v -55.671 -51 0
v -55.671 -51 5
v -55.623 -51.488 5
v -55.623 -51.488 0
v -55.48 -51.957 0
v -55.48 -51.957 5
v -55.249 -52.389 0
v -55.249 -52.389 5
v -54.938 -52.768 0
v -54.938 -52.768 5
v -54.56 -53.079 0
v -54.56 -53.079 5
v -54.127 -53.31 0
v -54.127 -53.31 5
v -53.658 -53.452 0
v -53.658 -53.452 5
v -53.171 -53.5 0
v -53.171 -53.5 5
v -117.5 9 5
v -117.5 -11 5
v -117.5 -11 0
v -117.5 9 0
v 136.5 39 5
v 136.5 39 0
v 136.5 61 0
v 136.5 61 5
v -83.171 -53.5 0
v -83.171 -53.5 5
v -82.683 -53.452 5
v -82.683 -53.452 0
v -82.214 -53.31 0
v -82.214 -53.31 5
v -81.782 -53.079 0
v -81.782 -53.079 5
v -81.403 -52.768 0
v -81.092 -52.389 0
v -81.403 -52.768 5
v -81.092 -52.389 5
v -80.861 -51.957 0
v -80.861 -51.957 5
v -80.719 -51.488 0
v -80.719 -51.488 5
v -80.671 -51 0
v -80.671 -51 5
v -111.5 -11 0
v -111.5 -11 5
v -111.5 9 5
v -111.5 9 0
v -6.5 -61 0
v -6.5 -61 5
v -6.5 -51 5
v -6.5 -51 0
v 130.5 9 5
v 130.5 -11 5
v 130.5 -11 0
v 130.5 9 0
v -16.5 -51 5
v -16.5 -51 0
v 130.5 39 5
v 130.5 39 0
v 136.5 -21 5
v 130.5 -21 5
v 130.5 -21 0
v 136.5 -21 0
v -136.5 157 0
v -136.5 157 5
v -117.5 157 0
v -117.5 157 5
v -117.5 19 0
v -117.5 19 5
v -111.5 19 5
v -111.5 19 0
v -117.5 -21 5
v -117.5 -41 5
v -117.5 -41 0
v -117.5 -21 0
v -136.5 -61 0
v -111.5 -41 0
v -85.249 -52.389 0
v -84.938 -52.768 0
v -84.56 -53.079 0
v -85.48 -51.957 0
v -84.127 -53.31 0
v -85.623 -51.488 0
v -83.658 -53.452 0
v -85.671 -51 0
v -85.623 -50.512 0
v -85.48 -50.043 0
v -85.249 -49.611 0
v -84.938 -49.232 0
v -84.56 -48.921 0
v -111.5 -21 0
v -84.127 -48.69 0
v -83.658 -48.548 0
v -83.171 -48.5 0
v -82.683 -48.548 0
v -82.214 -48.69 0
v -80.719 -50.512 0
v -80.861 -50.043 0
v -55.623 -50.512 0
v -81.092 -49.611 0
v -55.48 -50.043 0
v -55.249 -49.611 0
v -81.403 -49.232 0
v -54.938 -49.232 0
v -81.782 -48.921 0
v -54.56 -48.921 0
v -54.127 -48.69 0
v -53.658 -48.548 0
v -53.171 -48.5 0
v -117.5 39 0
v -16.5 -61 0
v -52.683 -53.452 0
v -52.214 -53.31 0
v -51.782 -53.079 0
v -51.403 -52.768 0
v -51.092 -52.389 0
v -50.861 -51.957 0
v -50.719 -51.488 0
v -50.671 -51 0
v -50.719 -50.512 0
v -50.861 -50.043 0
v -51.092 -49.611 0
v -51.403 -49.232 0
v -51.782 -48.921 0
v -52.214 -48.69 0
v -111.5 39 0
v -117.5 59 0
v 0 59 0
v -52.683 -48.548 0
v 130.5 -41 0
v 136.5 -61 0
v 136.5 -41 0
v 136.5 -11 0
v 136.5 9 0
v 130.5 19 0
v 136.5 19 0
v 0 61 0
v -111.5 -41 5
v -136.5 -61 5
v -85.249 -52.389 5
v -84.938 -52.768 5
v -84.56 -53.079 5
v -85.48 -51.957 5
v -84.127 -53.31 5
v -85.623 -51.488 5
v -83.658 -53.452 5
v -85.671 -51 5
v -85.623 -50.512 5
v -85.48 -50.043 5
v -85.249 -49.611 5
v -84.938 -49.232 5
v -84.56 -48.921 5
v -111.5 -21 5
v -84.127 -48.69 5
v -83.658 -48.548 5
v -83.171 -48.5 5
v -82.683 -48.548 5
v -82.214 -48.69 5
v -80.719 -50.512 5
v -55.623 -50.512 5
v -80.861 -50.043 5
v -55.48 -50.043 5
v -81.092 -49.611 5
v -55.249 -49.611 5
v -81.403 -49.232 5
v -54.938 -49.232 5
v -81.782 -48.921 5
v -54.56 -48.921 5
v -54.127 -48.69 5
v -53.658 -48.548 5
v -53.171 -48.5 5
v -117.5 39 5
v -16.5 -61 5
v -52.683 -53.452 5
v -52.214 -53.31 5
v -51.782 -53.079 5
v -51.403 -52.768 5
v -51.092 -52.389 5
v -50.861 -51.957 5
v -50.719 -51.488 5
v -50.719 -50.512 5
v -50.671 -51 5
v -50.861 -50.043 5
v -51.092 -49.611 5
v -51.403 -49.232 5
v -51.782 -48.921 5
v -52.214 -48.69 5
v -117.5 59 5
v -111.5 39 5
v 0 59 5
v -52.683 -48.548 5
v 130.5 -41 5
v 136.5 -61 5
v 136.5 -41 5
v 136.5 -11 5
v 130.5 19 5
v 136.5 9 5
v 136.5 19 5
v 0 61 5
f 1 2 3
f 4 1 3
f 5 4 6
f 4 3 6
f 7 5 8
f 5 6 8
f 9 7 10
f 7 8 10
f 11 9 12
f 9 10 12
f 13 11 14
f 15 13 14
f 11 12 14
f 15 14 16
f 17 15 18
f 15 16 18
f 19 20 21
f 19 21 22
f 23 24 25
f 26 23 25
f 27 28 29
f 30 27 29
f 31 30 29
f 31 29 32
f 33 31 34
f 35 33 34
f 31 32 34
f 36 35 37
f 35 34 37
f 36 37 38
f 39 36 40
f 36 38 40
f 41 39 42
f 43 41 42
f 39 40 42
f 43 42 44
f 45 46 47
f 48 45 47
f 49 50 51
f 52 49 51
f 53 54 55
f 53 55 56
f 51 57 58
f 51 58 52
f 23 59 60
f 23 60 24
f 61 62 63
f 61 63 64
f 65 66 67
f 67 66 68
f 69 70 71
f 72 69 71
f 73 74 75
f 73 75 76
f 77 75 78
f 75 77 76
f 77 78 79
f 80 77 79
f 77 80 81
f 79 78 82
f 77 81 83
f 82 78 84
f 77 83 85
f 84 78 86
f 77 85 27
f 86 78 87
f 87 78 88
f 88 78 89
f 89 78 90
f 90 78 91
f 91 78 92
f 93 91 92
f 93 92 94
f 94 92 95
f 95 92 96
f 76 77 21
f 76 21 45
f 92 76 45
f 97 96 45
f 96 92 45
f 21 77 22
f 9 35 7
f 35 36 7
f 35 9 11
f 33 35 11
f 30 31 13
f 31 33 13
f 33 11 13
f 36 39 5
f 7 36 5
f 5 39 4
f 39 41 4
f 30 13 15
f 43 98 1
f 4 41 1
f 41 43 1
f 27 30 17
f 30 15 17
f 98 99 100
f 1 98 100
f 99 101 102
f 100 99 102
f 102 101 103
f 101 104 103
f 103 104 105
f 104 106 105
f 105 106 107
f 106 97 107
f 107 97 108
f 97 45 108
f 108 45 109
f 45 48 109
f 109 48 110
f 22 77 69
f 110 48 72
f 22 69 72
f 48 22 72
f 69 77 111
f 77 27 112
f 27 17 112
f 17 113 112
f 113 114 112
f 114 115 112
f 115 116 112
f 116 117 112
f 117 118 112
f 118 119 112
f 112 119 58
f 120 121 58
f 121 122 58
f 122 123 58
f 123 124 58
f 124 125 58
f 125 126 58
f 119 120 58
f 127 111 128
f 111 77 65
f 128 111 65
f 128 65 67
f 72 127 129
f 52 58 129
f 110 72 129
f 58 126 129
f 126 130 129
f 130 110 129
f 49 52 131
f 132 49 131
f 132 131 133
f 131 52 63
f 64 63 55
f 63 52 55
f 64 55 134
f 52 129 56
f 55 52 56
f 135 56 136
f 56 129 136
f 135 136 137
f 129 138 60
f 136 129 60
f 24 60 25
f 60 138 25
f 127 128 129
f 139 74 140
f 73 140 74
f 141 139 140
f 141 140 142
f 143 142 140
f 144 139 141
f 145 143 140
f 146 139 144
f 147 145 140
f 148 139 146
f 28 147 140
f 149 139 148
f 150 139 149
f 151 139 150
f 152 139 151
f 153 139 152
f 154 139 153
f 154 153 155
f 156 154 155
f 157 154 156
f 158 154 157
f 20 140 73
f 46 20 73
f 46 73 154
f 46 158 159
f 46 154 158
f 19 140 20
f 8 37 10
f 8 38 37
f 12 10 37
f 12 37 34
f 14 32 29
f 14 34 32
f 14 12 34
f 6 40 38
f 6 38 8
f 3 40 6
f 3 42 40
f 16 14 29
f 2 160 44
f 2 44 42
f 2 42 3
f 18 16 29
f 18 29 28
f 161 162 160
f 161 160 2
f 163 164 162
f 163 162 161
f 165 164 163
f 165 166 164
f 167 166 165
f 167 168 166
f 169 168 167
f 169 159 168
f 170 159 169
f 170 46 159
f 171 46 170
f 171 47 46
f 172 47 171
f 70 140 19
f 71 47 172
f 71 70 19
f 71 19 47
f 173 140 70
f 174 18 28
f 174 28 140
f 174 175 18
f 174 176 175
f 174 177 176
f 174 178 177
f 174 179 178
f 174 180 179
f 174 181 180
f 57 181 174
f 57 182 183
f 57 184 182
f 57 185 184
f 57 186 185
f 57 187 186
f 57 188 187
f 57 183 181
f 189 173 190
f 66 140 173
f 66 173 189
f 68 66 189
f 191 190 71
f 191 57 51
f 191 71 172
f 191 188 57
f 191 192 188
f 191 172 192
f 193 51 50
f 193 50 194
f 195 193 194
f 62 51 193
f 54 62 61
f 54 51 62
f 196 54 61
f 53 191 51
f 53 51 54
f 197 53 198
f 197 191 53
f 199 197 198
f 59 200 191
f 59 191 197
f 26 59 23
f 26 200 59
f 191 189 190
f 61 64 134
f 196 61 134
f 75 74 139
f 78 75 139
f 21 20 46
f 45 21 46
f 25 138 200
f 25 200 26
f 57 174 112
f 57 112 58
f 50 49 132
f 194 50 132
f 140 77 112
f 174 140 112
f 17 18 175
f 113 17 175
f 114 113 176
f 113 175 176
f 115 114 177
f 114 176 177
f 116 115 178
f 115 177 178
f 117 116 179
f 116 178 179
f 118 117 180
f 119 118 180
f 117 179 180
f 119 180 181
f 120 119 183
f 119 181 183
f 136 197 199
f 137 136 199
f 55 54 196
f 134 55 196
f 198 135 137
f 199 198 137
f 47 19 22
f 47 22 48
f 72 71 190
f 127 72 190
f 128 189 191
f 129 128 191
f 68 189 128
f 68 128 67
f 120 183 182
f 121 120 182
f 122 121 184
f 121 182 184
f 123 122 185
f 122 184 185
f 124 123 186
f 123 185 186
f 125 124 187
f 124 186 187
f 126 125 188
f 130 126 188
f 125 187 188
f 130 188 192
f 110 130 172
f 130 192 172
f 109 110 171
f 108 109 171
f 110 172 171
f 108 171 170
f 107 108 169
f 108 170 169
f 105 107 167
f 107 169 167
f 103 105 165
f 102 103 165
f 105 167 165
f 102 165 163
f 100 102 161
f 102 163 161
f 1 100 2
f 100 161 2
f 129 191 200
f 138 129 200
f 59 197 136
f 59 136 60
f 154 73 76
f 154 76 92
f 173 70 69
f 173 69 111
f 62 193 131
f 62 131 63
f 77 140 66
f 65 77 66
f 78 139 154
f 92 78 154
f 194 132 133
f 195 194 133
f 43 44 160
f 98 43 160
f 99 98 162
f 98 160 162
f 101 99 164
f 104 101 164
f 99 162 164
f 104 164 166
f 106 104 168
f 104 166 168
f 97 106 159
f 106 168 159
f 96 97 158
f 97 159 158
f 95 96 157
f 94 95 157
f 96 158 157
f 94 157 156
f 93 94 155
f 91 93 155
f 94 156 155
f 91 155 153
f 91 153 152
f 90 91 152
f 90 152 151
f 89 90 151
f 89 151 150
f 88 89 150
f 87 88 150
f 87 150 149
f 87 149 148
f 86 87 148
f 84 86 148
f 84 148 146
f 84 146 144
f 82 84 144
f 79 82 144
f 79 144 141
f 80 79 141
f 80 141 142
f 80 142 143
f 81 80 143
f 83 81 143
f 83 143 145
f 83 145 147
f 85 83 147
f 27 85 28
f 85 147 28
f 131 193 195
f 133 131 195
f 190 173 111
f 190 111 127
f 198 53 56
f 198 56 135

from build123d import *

# Parameters (mm, degrees)
SKETCH1_W           = 273
SKETCH1_H           = 122
BOSS_EXTRUDE1_DEPTH = 5
SKETCH2_W           = 19
SKETCH2_H           = 96
BOSS_EXTRUDE2_DEPTH = 5
SKETCH3_W           = 6
SKETCH3_H           = 20
CUT_EXTRUDE1_DEPTH  = 6
SKETCH6_W           = 117.5
SKETCH6_H           = 2
CUT_EXTRUDE3_DEPTH  = 6
CUT_EXTRUDE4_DEPTH  = 10
SKETCH8_W           = 10
SKETCH8_H           = 10
CUT_EXTRUDE5_DEPTH  = 10


with BuildPart() as part:
    # Sketch1 → Boss-Extrude1 (new body)
    with BuildSketch(Plane.XY):
        Rectangle(SKETCH1_W, SKETCH1_H)
    extrude(amount=BOSS_EXTRUDE1_DEPTH)

    # Sketch2 → Boss-Extrude2 (add)
    with BuildSketch(Plane.XY.offset(5)):
        with Locations((-127, 109)):
            Rectangle(SKETCH2_W, SKETCH2_H)
    extrude(amount=-BOSS_EXTRUDE2_DEPTH)

    # Sketch3 → Cut-Extrude1 (cut)
    with BuildSketch(Plane.XY.offset(5)):
        with Locations((-114.5, 29)):
            Rectangle(SKETCH3_W, SKETCH3_H)
        with Locations((-114.5, -1)):
            Rectangle(SKETCH3_W, SKETCH3_H)
        with Locations((-114.5, -31)):
            Rectangle(SKETCH3_W, SKETCH3_H)
        with Locations((133.5, 29)):
            Rectangle(SKETCH3_W, SKETCH3_H)
        with Locations((133.5, -1)):
            Rectangle(SKETCH3_W, SKETCH3_H)
        with Locations((133.5, -31)):
            Rectangle(SKETCH3_W, SKETCH3_H)
    extrude(amount=-CUT_EXTRUDE1_DEPTH, mode=Mode.SUBTRACT)

    # Sketch6 → Cut-Extrude3 (cut)
    with BuildSketch(Plane.XY.offset(5)):
        with Locations((-58.75, 60)):
            Rectangle(SKETCH6_W, SKETCH6_H)
    extrude(amount=-CUT_EXTRUDE3_DEPTH, mode=Mode.SUBTRACT)

    # Sketch7 → Cut-Extrude4 (cut)
    with BuildSketch(Plane.XY.offset(5)):
        with BuildLine():
            ThreePointArc((-80.670694004, -51), (-84.938460957, -49.232233047), (-83.170694004, -53.5))
            Line((-83.170694004, -53.5), (-83.170694004, -51))
            Line((-83.170694004, -51), (-80.670694004, -51))
        make_face()
        with BuildLine():
            Line((-83.170694004, -51), (-83.170694004, -53.5))
            ThreePointArc((-83.170694004, -53.5), (-81.402927051, -52.767766953), (-80.670694004, -51))
            Line((-80.670694004, -51), (-83.170694004, -51))
        make_face()
        with BuildLine():
            ThreePointArc((-55.670694004, -51), (-54.938460957, -52.767766953), (-53.170694004, -53.5))
            Line((-53.170694004, -53.5), (-53.170694004, -51))
            Line((-53.170694004, -51), (-55.670694004, -51))
        make_face()
        with BuildLine():
            Line((-53.170694004, -51), (-53.170694004, -53.5))
            ThreePointArc((-53.170694004, -53.5), (-51.402927051, -52.767766953), (-50.670694004, -51))
            ThreePointArc((-50.670694004, -51), (-53.170694004, -48.5), (-55.670694004, -51))
            Line((-55.670694004, -51), (-53.170694004, -51))
        make_face()
    extrude(amount=-CUT_EXTRUDE4_DEPTH, mode=Mode.SUBTRACT)

    # Sketch8 → Cut-Extrude5 (cut)
    with BuildSketch(Plane.XY.offset(5)):
        with Locations((-11.5, -56)):
            Rectangle(SKETCH8_W, SKETCH8_H)
    extrude(amount=-CUT_EXTRUDE5_DEPTH, mode=Mode.SUBTRACT)


solid = part.part
